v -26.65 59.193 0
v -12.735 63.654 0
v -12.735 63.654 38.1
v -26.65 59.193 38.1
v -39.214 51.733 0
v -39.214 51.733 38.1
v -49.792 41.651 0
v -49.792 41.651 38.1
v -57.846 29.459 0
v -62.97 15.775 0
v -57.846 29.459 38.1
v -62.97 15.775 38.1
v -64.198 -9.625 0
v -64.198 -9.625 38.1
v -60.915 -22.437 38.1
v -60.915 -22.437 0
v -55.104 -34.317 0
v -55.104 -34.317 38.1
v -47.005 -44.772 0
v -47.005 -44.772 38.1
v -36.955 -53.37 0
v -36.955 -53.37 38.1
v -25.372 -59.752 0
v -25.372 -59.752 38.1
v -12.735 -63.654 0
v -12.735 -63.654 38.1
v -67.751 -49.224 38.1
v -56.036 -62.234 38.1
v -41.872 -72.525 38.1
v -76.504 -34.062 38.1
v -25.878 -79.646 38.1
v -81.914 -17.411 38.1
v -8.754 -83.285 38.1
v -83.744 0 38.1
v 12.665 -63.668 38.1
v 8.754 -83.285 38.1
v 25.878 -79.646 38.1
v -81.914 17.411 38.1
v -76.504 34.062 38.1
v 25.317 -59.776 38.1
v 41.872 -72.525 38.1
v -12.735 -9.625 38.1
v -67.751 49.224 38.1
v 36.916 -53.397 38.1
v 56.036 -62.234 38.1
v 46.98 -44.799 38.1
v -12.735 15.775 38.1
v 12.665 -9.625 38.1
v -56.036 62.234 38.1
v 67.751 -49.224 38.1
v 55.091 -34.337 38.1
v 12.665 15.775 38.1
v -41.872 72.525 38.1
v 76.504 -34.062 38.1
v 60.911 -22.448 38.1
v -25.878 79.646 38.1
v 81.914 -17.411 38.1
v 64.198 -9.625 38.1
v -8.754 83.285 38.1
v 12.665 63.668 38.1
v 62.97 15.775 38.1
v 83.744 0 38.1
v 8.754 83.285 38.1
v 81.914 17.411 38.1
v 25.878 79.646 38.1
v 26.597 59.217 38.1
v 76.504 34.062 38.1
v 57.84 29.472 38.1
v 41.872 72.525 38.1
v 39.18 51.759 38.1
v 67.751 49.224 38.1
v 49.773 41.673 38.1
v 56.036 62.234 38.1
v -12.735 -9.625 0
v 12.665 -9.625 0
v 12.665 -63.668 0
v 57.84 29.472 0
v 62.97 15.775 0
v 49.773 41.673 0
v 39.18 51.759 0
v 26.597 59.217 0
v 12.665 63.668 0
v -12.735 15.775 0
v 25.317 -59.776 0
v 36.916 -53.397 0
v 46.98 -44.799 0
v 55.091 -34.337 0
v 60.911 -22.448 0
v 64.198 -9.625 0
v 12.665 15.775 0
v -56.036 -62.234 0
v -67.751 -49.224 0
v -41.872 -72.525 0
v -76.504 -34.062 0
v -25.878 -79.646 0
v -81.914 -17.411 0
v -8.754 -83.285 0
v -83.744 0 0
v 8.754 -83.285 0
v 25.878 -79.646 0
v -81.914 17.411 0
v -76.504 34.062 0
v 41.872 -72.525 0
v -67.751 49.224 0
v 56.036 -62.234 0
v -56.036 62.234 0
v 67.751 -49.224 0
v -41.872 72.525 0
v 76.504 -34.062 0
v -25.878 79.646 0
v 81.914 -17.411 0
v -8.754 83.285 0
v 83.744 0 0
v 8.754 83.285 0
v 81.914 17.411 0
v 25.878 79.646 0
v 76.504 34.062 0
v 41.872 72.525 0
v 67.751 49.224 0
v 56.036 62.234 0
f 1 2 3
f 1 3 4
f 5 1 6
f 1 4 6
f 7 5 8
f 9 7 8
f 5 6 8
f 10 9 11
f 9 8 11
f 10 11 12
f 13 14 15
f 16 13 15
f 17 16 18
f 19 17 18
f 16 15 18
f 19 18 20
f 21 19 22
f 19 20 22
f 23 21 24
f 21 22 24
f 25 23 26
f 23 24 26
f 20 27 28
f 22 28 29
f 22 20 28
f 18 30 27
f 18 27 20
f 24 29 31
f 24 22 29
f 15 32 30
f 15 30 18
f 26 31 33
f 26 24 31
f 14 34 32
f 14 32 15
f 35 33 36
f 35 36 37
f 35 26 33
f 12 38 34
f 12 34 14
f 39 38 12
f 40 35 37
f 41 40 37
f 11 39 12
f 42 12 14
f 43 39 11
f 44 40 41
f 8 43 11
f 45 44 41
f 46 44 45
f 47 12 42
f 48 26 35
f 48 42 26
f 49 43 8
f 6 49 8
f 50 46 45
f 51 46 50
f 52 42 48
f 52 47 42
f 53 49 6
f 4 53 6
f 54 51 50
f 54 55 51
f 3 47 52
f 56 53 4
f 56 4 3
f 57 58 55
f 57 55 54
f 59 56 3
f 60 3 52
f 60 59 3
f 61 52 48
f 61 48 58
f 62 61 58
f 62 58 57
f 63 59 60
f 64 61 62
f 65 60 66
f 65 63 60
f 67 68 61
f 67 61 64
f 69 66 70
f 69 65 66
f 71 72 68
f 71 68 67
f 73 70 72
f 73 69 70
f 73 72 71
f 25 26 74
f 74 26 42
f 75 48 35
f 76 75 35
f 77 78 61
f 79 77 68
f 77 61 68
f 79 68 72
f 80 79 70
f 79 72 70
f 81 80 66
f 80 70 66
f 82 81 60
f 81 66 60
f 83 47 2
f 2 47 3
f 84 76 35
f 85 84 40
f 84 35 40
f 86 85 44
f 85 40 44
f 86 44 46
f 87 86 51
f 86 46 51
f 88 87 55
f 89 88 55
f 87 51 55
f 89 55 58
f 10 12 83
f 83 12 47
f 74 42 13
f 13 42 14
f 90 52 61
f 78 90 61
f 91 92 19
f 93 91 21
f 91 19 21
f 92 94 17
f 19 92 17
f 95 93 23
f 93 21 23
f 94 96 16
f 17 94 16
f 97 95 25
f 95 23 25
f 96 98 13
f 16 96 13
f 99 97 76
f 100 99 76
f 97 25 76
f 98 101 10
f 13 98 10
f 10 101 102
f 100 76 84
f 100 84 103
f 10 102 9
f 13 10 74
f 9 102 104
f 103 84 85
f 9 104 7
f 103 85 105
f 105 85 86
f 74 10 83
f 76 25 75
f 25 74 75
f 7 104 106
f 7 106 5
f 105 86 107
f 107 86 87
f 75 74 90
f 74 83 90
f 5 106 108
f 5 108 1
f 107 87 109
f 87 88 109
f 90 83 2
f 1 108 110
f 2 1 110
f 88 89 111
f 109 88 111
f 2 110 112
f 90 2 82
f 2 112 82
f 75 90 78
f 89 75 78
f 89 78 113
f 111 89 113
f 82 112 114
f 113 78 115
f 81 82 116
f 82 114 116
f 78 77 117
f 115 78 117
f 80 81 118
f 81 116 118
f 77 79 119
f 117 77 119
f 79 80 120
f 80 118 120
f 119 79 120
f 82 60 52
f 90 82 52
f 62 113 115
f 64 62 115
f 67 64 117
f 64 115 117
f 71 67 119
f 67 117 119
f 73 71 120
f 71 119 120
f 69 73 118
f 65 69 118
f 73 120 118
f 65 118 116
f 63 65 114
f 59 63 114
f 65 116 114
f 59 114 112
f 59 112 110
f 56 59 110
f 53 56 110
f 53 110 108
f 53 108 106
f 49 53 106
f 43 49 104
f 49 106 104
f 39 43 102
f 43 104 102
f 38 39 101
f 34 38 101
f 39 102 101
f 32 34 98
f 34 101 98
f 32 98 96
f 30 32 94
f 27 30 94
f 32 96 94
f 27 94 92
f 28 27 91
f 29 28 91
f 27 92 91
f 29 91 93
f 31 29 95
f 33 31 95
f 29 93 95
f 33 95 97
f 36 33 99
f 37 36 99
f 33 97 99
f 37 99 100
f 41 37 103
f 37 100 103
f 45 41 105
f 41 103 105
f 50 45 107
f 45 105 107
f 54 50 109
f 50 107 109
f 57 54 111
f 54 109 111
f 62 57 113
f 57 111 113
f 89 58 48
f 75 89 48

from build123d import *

# Parameters (mm, degrees)
F0_R     = 83.7442407906
F1_DEPTH = 38.1
F3_DEPTH = 50.8


with BuildPart() as f1:
    # F0 (on Top) → F1 (new body)
    with BuildSketch(Plane.XY):
        Circle(F0_R)
    extrude(amount=F1_DEPTH)

    # F2 (on face) → F3 (cut)
    with BuildSketch(Plane.XY.offset(38.1)):
        with BuildLine():
            Line((12.6646681265, 15.7748187695), (62.9699063944, 15.7748187695))
            ThreePointArc((62.9699063944, 15.7748187695), (44.7615355408, 47.0155182314), (12.6646681265, 63.6683610578))
            Line((12.6646681265, 63.6683610578), (12.6646681265, 15.7748187695))
        make_face()
        with BuildLine():
            ThreePointArc((12.6646681265, -63.6683610578), (46.9802272386, -44.7985743874), (64.1982079564, -9.6251812305))
            Line((64.1982079564, -9.6251812305), (12.6646681265, -9.6251812305))
            Line((12.6646681265, -9.6251812305), (12.6646681265, -63.6683610578))
        make_face()
        with BuildLine():
            Line((-12.7353318735, 15.7748187695), (-12.7353318735, 63.6542641196))
            ThreePointArc((-12.7353318735, 63.6542641196), (-44.7876221412, 46.990668451), (-62.9699063944, 15.7748187695))
            Line((-62.9699063944, 15.7748187695), (-12.7353318735, 15.7748187695))
        make_face()
        with BuildLine():
            ThreePointArc((-64.1982079564, -9.6251812305), (-47.0050830991, -44.7724935801), (-12.7353318735, -63.6542641196))
            Line((-12.7353318735, -63.6542641196), (-12.7353318735, -9.6251812305))
            Line((-12.7353318735, -9.6251812305), (-64.1982079564, -9.6251812305))
        make_face()
    extrude(amount=-F3_DEPTH, mode=Mode.SUBTRACT)


solid = f1.part
